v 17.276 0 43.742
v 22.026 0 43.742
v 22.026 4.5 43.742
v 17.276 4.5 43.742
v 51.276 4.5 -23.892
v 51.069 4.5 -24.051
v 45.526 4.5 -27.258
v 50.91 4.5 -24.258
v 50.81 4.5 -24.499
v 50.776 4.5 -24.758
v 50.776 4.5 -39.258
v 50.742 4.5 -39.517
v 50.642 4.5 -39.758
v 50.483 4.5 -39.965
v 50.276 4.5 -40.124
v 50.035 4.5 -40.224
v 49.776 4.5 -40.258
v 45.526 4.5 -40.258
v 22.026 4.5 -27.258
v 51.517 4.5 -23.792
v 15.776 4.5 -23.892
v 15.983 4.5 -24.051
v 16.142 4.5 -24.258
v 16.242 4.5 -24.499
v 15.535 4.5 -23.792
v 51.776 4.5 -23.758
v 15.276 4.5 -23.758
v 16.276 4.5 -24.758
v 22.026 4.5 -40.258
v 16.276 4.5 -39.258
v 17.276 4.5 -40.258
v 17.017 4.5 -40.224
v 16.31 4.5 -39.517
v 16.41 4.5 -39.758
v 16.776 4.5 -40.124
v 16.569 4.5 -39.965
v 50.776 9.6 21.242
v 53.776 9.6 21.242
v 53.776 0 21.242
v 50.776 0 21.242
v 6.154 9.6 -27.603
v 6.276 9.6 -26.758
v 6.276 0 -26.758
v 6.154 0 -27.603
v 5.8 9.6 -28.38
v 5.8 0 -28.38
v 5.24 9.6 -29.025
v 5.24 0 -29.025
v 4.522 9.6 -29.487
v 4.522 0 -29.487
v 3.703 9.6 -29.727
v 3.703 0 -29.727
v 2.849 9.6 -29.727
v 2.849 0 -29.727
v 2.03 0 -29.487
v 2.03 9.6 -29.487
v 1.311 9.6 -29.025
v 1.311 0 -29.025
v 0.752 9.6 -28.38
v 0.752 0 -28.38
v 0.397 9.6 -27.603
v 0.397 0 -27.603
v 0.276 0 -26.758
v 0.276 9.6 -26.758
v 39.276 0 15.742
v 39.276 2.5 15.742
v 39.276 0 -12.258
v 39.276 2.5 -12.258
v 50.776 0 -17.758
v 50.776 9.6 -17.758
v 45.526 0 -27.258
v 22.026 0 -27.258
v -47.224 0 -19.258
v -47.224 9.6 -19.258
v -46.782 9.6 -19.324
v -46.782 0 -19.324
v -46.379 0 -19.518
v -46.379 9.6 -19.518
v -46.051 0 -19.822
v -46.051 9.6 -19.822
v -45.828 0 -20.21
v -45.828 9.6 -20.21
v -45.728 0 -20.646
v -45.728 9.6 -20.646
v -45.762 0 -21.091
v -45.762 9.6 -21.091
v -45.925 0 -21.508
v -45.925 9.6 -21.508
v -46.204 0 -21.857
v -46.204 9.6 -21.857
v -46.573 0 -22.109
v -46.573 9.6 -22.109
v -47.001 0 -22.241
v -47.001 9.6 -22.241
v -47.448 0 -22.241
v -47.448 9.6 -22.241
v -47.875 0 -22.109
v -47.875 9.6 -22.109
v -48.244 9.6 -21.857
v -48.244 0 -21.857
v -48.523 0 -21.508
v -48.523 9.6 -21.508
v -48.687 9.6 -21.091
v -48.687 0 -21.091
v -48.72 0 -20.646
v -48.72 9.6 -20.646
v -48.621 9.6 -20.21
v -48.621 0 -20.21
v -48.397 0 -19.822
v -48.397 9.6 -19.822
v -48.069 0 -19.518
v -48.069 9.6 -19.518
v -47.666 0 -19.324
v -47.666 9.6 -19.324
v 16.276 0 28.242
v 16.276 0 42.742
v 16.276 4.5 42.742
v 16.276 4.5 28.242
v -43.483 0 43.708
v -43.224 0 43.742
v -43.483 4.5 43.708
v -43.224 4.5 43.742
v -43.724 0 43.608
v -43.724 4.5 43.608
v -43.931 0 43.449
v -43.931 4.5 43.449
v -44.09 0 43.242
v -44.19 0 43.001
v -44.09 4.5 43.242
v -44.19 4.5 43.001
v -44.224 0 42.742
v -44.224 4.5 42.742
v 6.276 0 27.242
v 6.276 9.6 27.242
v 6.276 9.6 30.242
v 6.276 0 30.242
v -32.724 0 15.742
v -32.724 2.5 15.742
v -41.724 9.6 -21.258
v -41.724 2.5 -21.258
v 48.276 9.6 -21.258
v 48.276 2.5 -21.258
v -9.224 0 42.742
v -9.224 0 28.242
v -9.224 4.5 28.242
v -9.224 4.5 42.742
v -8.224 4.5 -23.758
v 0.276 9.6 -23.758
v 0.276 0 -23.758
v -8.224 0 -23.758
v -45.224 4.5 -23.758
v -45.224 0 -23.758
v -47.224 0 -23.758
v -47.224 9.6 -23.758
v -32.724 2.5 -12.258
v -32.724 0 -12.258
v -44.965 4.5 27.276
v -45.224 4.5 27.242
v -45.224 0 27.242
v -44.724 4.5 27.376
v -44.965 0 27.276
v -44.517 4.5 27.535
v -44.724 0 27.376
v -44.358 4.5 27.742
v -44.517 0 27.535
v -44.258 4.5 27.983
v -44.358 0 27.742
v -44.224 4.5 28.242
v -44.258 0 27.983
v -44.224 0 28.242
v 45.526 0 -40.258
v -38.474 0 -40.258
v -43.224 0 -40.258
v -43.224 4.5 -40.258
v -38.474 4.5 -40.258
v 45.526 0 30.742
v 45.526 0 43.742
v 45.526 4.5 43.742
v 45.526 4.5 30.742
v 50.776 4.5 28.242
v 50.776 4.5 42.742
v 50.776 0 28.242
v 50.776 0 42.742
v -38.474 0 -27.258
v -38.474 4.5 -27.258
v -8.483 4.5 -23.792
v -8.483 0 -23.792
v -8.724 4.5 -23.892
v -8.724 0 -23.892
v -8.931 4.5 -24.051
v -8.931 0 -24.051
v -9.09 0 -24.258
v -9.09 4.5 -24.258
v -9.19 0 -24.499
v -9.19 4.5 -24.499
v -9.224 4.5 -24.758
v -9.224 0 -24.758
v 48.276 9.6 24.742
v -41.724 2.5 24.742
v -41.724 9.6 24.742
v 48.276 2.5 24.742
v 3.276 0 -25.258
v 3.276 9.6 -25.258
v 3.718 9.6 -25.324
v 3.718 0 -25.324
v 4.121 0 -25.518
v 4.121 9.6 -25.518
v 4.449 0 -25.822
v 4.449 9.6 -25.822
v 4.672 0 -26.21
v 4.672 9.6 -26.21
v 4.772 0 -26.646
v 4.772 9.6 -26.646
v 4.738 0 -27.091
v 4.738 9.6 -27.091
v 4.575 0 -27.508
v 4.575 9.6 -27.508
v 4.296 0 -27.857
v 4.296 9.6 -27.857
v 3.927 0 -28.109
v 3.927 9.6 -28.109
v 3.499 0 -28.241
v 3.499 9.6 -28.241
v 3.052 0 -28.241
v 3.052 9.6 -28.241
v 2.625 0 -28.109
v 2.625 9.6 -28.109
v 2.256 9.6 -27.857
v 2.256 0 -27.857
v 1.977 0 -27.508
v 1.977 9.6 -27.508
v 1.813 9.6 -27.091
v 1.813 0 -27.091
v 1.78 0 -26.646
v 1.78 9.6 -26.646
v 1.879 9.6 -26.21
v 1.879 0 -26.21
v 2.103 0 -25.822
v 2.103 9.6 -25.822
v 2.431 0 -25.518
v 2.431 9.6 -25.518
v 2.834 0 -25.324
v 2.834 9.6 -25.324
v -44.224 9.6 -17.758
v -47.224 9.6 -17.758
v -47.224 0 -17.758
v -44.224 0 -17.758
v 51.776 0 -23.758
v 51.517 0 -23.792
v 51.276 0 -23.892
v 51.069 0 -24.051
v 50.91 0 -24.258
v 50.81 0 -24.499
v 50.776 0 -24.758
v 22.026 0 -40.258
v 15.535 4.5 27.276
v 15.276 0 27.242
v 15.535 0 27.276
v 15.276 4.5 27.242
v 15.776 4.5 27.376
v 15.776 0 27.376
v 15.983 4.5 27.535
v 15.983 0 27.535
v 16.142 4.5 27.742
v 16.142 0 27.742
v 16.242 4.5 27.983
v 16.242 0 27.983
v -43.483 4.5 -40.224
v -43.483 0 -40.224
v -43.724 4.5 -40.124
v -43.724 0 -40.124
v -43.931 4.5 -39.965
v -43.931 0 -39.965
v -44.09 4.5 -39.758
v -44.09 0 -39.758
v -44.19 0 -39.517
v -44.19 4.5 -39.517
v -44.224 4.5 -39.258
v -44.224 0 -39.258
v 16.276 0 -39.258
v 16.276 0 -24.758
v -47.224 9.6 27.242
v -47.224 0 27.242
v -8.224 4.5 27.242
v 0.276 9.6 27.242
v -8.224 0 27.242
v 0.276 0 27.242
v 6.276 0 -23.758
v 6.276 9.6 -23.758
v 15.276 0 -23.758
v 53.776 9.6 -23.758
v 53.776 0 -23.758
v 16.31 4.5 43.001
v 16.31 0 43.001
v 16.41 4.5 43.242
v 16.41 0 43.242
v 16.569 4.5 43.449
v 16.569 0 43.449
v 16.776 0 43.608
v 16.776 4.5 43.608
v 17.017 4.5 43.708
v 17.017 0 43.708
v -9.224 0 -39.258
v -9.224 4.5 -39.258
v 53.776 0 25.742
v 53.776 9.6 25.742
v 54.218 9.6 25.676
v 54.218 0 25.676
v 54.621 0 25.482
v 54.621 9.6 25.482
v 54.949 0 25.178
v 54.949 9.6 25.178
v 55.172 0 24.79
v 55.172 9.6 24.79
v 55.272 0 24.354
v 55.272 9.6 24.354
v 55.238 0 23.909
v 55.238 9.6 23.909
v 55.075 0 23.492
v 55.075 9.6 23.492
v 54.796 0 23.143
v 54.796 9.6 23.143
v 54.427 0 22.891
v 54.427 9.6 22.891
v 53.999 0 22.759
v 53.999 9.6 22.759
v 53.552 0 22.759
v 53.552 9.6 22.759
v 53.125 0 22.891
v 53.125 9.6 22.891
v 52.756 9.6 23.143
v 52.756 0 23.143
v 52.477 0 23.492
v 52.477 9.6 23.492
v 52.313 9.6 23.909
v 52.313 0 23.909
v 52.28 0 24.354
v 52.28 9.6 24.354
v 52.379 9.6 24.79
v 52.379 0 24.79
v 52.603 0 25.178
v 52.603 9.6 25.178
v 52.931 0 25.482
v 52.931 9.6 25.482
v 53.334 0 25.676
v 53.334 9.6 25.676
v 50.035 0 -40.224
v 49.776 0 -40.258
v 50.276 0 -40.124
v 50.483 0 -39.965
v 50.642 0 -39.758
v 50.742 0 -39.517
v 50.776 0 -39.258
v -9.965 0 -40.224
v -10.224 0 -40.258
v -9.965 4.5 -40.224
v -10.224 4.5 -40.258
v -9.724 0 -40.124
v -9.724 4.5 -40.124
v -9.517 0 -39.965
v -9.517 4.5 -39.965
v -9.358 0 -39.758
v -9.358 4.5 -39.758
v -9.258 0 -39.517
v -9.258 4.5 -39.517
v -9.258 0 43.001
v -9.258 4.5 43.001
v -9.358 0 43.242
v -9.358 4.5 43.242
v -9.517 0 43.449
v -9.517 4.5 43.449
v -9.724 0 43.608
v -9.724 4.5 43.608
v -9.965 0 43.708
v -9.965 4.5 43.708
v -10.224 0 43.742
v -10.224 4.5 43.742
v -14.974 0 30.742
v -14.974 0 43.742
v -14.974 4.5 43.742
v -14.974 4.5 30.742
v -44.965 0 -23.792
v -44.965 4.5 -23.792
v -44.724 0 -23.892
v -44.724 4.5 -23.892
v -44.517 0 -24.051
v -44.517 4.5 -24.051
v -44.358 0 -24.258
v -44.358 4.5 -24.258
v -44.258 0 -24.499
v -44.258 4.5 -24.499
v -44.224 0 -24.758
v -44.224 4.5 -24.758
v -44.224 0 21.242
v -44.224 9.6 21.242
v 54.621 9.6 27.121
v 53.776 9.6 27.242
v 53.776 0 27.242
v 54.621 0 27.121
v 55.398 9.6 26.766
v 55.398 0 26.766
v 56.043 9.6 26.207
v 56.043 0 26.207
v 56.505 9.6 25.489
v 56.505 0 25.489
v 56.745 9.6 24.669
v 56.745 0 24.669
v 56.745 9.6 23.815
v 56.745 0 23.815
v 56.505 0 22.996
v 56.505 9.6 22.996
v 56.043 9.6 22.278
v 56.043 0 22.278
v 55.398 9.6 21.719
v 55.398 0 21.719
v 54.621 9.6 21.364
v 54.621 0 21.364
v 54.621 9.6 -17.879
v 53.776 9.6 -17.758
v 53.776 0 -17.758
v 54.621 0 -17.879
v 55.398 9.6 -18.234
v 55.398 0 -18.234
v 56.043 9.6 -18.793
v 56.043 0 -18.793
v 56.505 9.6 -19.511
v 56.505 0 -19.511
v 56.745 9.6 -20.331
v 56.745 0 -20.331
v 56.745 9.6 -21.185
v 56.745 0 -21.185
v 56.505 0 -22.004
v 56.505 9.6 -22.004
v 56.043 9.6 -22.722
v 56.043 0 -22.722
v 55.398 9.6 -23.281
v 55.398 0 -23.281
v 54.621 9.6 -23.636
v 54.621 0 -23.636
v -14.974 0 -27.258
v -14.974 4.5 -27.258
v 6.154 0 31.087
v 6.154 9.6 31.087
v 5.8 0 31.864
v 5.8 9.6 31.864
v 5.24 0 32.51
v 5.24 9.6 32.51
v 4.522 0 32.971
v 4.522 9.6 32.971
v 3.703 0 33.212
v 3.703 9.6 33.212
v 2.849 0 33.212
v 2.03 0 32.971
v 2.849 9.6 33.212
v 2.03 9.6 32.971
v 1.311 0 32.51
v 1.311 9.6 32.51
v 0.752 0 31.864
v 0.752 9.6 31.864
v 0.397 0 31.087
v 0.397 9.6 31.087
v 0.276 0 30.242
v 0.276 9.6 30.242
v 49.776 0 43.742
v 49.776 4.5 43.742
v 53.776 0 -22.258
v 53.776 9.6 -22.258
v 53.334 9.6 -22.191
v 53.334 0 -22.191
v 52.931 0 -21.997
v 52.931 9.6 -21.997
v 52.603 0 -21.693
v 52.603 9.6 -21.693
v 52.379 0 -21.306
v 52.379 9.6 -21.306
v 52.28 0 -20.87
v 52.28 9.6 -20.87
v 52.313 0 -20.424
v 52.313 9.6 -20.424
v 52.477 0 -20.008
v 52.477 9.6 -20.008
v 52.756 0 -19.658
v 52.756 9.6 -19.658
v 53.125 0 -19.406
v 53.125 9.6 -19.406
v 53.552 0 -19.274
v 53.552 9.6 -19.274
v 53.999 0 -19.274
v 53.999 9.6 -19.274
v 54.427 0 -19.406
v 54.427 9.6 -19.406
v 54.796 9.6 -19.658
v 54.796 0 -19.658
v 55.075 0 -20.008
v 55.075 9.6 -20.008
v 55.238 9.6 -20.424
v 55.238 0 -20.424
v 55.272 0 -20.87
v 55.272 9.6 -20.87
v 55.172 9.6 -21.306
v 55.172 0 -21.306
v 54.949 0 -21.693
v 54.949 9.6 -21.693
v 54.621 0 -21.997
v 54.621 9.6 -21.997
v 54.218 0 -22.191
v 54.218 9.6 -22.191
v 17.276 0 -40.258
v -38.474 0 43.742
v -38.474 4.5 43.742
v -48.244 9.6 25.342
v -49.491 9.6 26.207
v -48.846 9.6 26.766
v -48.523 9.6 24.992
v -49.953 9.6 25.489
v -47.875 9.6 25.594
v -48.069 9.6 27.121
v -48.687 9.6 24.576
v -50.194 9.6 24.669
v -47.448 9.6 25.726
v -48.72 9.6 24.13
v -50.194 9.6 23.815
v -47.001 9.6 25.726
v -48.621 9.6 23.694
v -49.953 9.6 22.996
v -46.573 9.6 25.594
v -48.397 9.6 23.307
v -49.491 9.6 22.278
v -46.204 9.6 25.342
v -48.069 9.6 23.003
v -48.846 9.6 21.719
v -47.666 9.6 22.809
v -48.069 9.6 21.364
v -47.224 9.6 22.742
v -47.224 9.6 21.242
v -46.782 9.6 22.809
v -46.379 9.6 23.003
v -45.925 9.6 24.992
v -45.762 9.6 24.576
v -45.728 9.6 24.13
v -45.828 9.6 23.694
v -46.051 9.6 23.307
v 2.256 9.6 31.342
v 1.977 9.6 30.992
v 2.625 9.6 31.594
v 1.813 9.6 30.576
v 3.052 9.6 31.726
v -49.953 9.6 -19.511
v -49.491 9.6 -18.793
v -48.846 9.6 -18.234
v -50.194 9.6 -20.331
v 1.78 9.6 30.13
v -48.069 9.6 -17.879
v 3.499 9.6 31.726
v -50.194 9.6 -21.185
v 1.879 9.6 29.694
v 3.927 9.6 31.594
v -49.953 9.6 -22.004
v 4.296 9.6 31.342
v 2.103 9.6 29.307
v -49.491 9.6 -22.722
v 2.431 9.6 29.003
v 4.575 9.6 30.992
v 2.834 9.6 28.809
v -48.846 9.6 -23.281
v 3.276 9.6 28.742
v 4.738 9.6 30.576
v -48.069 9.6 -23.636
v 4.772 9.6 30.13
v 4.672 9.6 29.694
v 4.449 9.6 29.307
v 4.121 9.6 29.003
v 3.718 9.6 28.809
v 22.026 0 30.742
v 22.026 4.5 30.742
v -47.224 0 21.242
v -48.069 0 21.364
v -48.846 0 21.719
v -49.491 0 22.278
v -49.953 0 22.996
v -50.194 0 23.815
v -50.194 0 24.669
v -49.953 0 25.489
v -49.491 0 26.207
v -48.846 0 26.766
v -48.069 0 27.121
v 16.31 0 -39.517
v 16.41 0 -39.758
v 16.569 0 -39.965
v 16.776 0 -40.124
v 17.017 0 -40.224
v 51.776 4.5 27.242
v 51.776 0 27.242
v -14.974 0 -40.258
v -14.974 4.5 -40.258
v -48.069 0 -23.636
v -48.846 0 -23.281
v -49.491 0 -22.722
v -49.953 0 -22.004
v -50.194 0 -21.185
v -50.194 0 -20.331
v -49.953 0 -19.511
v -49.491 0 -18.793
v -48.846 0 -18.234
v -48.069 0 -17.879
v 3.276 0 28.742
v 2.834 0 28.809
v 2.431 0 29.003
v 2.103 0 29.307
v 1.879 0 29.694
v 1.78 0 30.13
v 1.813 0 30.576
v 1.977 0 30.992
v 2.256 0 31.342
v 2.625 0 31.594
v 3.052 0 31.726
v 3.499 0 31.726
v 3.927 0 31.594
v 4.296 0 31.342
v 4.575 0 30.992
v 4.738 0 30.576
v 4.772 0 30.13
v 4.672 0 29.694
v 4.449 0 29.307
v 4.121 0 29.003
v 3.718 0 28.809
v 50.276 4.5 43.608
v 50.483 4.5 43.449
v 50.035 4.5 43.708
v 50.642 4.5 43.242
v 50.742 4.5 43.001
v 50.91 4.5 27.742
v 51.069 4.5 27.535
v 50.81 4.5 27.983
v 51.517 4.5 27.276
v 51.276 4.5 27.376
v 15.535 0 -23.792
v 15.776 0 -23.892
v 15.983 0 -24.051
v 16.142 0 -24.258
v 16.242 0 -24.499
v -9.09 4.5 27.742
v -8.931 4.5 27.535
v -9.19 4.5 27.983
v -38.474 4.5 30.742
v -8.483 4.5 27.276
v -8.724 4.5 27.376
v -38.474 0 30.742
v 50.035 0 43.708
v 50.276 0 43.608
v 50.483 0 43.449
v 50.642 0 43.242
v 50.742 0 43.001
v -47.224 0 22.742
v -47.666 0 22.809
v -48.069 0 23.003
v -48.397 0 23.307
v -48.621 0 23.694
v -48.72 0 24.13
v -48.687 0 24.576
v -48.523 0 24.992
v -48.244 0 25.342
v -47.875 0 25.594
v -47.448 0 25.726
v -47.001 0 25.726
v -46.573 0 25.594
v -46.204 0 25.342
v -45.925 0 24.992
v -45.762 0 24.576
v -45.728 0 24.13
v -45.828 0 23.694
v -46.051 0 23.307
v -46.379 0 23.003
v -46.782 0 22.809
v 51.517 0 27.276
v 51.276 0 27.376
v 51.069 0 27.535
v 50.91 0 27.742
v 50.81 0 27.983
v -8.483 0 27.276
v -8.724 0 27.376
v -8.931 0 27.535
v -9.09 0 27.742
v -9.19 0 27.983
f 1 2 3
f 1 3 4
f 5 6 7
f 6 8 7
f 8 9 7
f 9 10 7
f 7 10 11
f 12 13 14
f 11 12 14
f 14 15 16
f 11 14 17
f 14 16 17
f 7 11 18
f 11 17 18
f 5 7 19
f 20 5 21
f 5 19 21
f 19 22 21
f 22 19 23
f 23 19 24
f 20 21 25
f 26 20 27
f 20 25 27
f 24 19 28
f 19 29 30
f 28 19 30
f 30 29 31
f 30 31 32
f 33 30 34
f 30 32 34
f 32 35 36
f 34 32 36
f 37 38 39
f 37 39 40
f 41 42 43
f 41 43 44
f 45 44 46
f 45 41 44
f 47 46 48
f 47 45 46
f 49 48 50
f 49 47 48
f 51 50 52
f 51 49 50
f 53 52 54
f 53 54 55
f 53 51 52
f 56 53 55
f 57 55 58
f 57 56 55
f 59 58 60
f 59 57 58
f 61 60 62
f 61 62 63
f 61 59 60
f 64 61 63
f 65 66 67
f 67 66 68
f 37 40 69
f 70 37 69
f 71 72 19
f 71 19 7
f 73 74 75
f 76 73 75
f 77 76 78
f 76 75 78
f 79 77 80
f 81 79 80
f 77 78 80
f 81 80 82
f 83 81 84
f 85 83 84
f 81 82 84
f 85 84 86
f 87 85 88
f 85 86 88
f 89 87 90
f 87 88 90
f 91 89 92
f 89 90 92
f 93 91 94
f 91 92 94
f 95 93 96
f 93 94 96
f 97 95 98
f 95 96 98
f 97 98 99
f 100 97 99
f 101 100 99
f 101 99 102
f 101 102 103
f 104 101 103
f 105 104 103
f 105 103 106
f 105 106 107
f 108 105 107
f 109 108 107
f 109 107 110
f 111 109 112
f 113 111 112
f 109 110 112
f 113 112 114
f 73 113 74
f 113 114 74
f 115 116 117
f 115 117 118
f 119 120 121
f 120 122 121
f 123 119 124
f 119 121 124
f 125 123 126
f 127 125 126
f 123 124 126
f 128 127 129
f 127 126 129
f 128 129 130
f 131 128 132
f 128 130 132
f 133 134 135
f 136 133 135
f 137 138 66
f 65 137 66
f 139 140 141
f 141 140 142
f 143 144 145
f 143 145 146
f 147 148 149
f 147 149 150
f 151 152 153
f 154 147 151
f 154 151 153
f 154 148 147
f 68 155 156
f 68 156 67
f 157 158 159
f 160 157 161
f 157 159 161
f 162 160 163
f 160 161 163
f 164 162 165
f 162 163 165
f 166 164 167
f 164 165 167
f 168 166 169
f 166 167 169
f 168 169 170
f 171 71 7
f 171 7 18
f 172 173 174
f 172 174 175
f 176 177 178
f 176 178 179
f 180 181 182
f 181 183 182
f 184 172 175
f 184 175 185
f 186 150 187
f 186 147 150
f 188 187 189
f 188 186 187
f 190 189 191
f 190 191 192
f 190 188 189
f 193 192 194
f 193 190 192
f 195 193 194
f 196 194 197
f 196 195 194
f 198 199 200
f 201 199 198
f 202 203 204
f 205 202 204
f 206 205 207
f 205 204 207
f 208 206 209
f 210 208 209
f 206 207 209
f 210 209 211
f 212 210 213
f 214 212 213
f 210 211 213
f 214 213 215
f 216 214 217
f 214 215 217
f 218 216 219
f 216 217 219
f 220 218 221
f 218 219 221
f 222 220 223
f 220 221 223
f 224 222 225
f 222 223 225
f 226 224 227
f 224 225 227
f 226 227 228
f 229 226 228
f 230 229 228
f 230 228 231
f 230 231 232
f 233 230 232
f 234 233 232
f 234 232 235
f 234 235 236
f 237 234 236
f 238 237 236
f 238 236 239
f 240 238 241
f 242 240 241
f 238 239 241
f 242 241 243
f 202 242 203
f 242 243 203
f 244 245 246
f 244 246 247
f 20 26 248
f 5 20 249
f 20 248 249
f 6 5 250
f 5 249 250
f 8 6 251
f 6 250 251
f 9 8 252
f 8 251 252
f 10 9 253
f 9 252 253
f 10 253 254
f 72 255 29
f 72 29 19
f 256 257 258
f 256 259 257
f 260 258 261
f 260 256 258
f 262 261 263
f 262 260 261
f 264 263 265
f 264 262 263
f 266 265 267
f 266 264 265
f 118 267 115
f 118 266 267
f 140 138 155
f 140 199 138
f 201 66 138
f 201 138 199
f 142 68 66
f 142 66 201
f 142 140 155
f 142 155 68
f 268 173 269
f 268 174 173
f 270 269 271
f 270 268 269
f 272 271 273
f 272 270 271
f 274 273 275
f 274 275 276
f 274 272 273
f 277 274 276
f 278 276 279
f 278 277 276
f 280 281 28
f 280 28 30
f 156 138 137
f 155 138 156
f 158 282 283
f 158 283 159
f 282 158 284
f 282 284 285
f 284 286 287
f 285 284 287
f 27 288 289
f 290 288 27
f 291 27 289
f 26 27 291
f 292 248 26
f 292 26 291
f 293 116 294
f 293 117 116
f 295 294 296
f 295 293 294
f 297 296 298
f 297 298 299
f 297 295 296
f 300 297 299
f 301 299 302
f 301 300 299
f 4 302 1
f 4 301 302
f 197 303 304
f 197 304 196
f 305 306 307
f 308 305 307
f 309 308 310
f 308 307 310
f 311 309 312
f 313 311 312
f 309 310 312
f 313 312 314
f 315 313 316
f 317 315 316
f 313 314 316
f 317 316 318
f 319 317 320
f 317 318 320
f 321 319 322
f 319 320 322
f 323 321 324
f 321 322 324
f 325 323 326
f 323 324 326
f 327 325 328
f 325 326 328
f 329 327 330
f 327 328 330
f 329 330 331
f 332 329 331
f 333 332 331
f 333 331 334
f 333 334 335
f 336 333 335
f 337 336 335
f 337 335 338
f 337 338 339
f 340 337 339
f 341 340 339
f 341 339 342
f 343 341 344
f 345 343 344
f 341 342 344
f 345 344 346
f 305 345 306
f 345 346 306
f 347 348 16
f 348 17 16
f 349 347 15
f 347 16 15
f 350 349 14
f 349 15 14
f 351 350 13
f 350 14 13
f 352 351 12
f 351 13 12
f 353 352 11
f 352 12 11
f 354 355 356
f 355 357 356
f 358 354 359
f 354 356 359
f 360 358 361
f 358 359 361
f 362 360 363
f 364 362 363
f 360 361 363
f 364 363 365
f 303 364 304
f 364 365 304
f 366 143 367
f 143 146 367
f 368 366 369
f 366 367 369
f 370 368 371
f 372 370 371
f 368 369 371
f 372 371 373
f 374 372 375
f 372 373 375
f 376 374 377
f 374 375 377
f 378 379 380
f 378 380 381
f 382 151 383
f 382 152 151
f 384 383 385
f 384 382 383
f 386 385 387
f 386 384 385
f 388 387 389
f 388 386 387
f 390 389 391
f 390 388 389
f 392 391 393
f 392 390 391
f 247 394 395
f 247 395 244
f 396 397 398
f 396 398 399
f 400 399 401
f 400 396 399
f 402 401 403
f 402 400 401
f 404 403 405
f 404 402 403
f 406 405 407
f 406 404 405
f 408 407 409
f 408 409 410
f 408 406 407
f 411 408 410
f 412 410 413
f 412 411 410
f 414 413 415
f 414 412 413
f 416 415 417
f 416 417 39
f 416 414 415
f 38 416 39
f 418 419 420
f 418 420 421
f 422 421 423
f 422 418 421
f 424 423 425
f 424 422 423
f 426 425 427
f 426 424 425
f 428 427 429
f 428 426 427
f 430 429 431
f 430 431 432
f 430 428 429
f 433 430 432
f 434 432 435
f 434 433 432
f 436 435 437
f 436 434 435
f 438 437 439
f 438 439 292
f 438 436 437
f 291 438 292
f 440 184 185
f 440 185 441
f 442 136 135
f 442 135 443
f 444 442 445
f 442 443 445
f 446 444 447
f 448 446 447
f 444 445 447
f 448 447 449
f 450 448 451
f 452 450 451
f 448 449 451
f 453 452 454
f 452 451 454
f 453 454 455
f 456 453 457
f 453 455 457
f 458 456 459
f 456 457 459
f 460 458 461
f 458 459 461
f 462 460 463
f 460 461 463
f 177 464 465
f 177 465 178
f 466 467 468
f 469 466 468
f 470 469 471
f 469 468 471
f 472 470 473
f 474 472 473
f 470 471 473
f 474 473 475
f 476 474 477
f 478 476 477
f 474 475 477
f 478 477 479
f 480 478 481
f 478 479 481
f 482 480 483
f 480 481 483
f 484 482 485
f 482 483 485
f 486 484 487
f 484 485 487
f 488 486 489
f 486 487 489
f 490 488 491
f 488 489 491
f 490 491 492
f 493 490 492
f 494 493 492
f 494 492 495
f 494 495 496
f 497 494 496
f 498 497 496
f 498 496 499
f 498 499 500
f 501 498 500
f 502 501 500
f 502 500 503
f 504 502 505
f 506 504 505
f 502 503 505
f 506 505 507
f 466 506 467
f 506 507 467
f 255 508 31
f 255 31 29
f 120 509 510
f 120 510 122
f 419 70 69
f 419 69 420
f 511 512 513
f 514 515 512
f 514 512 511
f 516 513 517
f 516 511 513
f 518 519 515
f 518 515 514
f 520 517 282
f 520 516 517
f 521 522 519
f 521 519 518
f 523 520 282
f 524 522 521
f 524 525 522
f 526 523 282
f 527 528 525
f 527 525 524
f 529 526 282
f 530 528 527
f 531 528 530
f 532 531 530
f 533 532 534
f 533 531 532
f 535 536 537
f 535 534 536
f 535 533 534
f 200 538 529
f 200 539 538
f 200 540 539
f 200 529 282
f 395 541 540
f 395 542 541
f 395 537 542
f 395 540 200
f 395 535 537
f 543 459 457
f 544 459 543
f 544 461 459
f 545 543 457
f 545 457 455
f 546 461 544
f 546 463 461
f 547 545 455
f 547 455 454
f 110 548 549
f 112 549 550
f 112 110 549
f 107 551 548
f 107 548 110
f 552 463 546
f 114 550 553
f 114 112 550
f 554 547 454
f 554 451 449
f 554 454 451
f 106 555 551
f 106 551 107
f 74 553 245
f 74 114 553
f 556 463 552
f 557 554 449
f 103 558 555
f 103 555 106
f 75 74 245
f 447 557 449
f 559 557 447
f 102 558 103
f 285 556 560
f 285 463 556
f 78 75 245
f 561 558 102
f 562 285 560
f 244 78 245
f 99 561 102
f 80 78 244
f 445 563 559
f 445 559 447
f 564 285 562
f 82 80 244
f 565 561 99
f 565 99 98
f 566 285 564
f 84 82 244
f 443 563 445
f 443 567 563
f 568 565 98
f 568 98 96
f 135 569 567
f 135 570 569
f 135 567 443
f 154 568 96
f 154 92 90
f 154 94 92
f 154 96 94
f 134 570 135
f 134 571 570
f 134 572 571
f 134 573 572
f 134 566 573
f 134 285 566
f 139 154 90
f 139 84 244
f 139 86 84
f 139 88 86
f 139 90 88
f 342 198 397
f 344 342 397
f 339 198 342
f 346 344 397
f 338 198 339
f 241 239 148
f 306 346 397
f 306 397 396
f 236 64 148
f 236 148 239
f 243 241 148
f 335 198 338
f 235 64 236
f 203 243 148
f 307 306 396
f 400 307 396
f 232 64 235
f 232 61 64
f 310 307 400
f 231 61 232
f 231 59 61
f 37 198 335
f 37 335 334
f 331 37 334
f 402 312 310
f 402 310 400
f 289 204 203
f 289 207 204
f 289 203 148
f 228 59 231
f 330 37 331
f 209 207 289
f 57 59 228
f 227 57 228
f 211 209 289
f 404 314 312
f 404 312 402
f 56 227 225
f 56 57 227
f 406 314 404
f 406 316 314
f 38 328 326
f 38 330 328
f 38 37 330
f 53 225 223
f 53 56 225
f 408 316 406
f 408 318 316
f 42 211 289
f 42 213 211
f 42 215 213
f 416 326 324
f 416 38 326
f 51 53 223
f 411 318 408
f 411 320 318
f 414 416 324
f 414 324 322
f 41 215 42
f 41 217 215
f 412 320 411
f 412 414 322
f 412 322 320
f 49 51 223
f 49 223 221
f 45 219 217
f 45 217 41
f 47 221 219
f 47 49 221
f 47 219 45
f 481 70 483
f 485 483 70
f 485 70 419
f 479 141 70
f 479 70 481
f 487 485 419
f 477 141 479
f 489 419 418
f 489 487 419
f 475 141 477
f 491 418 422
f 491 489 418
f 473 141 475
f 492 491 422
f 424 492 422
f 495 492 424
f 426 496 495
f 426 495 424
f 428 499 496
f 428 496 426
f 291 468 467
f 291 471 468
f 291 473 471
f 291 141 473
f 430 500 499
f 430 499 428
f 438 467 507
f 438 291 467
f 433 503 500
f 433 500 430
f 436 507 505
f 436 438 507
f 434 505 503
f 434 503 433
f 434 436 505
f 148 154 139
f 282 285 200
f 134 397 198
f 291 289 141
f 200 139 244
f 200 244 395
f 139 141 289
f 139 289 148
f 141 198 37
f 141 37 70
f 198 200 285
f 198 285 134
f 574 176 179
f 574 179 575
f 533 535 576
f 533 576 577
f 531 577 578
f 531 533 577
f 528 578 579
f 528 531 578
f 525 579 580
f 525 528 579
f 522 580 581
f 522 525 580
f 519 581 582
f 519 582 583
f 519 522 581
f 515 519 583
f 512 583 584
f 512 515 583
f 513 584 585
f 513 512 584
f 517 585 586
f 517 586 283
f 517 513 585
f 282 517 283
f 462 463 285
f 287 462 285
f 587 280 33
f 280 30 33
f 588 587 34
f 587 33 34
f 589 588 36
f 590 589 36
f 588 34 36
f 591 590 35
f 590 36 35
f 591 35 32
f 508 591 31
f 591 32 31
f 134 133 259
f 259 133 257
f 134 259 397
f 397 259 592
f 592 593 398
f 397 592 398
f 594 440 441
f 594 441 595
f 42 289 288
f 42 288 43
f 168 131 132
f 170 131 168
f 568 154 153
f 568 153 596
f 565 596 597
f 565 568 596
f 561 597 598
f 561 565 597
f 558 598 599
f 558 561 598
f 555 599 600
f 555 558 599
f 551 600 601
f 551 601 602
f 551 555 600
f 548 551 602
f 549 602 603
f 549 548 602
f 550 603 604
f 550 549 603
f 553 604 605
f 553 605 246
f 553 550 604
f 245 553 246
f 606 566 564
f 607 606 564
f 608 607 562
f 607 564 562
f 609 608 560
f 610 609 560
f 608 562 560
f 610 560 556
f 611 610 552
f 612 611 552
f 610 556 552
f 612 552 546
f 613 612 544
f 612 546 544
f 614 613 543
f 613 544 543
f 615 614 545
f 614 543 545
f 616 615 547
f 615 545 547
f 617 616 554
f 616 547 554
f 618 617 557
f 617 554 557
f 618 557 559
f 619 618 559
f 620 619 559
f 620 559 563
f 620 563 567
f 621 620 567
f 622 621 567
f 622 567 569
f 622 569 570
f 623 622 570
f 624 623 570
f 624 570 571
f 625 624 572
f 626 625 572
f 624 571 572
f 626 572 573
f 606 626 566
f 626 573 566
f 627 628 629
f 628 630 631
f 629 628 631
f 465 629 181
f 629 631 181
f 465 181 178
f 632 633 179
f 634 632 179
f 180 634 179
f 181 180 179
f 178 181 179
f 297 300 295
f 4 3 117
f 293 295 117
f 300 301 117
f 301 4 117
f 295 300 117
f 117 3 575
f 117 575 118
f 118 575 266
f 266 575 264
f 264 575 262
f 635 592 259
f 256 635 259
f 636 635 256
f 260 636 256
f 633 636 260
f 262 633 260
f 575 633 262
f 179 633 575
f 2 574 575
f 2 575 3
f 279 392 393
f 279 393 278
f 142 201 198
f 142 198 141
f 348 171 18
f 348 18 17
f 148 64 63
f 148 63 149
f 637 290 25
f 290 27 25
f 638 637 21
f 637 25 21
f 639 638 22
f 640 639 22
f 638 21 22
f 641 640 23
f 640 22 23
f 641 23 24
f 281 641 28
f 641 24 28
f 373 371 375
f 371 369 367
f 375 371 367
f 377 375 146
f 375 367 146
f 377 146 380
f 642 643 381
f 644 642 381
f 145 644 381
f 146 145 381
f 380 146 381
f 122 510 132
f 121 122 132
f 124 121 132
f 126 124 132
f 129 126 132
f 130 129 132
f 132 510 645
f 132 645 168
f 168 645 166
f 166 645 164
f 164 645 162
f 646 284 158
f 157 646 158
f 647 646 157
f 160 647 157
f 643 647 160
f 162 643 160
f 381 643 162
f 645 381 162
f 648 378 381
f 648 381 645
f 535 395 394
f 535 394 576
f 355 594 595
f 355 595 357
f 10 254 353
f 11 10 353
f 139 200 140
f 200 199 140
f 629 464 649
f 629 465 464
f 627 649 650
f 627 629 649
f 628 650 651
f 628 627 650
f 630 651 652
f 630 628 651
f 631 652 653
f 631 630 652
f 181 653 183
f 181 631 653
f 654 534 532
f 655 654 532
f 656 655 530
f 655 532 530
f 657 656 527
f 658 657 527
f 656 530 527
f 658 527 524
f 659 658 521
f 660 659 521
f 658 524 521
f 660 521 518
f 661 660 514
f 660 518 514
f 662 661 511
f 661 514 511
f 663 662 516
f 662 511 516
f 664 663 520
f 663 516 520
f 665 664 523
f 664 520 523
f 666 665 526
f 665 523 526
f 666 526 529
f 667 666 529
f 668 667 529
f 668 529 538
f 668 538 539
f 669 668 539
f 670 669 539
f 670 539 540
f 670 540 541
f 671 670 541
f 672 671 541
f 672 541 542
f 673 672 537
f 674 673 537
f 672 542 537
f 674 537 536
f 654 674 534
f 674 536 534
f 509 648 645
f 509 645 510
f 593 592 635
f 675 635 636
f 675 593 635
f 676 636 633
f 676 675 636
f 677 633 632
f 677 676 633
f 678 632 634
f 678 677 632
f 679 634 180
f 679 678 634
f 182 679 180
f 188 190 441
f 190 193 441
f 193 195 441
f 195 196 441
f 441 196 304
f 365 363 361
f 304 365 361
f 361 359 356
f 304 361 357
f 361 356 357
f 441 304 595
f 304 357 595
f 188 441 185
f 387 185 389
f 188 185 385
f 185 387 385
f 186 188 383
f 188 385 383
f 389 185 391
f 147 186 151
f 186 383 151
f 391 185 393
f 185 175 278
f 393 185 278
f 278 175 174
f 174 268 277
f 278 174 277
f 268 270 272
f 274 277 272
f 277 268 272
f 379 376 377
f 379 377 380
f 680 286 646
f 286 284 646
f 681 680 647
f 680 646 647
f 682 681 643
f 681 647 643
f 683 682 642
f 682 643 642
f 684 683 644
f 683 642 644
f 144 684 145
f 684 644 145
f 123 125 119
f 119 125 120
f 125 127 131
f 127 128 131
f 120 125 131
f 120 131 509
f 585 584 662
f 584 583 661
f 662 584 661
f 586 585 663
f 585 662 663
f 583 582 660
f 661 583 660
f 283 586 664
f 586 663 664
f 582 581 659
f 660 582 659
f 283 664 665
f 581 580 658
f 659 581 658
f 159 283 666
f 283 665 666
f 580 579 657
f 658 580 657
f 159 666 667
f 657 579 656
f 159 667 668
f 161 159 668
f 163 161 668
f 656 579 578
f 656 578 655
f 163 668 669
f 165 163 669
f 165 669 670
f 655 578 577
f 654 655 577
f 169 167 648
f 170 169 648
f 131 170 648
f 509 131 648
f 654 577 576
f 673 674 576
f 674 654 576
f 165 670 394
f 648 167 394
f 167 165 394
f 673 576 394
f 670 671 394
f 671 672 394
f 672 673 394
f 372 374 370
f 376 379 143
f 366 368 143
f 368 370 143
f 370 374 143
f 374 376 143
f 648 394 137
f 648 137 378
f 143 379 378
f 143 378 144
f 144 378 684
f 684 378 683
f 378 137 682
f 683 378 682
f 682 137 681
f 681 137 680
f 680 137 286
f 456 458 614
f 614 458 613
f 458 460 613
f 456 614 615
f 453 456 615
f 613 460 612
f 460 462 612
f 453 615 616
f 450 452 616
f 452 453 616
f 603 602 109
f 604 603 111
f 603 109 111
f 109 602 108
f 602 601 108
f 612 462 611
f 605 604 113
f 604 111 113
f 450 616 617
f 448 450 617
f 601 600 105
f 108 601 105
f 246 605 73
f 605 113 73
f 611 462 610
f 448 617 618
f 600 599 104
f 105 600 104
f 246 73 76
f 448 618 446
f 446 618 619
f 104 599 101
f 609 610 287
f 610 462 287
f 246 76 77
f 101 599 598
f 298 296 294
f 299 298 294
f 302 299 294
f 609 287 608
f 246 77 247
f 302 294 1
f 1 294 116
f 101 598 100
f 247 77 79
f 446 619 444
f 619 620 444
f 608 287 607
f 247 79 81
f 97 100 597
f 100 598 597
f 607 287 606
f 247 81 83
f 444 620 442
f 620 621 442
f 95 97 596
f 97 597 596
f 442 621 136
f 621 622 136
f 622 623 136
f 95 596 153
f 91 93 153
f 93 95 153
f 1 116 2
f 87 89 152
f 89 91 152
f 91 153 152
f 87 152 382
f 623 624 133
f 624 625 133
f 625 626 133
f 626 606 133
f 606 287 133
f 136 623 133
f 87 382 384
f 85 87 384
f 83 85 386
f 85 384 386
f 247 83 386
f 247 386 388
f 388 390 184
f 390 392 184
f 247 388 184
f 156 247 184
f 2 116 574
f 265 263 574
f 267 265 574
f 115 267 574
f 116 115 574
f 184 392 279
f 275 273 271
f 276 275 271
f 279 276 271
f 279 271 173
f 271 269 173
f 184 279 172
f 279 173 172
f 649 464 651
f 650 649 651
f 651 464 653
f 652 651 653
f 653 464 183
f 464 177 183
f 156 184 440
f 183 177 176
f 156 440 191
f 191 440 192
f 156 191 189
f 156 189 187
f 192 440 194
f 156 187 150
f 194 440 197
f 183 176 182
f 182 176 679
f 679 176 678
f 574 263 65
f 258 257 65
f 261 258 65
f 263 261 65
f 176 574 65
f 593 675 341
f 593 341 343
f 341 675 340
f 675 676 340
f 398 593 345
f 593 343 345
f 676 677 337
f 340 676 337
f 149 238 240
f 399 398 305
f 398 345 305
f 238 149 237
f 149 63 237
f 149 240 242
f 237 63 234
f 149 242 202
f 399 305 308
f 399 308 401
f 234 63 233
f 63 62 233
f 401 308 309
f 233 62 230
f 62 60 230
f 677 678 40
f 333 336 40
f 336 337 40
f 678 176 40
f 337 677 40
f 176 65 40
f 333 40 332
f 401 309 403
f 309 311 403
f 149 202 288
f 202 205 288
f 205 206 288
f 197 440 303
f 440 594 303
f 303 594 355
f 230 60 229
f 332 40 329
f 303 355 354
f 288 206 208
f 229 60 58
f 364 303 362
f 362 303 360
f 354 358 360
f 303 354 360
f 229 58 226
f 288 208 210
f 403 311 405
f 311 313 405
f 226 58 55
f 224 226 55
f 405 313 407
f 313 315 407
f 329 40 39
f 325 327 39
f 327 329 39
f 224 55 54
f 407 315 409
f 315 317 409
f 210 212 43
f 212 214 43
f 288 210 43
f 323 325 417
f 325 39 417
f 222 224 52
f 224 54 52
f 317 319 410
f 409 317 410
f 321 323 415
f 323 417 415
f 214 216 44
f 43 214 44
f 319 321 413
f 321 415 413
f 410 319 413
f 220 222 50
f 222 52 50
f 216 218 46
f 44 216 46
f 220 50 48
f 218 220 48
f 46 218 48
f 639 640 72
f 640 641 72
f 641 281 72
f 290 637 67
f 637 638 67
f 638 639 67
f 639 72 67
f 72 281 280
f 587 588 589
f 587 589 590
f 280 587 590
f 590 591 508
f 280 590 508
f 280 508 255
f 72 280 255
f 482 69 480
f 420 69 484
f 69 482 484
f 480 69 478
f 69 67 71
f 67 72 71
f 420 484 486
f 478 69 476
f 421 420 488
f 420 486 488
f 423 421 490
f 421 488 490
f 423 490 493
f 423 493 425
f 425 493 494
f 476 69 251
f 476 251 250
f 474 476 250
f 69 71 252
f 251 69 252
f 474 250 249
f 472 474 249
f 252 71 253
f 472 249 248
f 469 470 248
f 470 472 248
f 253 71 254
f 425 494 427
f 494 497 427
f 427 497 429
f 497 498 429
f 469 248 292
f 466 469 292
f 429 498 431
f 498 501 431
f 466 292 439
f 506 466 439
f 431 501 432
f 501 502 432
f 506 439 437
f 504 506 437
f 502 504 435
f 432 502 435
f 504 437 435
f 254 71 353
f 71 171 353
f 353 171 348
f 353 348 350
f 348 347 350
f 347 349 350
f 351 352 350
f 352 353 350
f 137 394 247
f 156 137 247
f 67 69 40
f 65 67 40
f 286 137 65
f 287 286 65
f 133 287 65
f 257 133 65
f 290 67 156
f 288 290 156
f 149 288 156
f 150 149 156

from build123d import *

# Parameters (mm, degrees)
BOSS_EXTRUDE1_DEPTH = 4.5
SKETCH2_W           = 72
SKETCH2_H           = 28
CUT_EXTRUDE1_DEPTH  = 4.5
SKETCH3_W           = 95
SKETCH3_H           = 51
SKETCH3_W_2         = 90
SKETCH3_H_2         = 46
BOSS_EXTRUDE2_DEPTH = 5.1
SKETCH4_W           = 90
SKETCH4_H           = 46
CUT_EXTRUDE2_DEPTH  = 2
SKETCH6_R           = 1.5
BOSS_EXTRUDE3_DEPTH = 9.6
FILLET1_R           = 1


with BuildPart() as part:
    # Sketch1 → Boss-Extrude1 (new body)
    with BuildSketch(Plane(origin=(0, 0, 0), x_dir=(1, 0, 0), z_dir=(0, 1, 0))):
        Polygon((-14.974237314, -43.742281537), (-14.974237314, -30.742281537), (-38.474237314, -30.742281537), (-38.474237314, -43.742281537), (-44.224237314, -43.742281537), (-44.224237314, 40.257718463), (-38.474237314, 40.257718463), (-38.474237314, 27.257718463), (-14.974237314, 27.257718463), (-14.974237314, 40.257718463), (-9.224237314, 40.257718463), (-9.224237314, 23.757718463), (16.275762686, 23.757718463), (16.275762686, 40.257718463), (22.025762686, 40.257718463), (22.025762686, 27.257718463), (45.525762686, 27.257718463), (45.525762686, 40.257718463), (50.775762686, 40.257718463), (50.775762686, -43.742281537), (45.525762686, -43.742281537), (45.525762686, -30.742281537), (22.025762686, -30.742281537), (22.025762686, -43.742281537), (16.275762686, -43.742281537), (16.275762686, -27.242281537), (-9.224237314, -27.242281537), (-9.224237314, -43.742281537), align=None)
    extrude(amount=BOSS_EXTRUDE1_DEPTH)

    # Sketch2 → Cut-Extrude1 (cut)
    with BuildSketch(Plane(origin=(0, 4.5, 0), x_dir=(1, 0, 0), z_dir=(0, 1, 0))):
        with Locations((3.275762686, -1.742281537)):
            Rectangle(SKETCH2_W, SKETCH2_H)
    extrude(amount=-CUT_EXTRUDE1_DEPTH, mode=Mode.SUBTRACT)

    # Sketch3 → Boss-Extrude2 (add)
    with BuildSketch(Plane(origin=(0, 4.5, 0), x_dir=(1, 0, 0), z_dir=(0, 1, 0))):
        with Locations((3.275762686, -1.742281537)):
            Rectangle(SKETCH3_W, SKETCH3_H)
        with Locations((3.275762686, -1.742281537)):
            Rectangle(SKETCH3_W_2, SKETCH3_H_2, mode=Mode.SUBTRACT)
    extrude(amount=BOSS_EXTRUDE2_DEPTH)

    # Sketch4 → Cut-Extrude2 (cut)
    with BuildSketch(Plane(origin=(0, 4.5, 0), x_dir=(1, 0, 0), z_dir=(0, 1, 0))):
        with Locations((3.275762686, -1.742281537)):
            Rectangle(SKETCH4_W, SKETCH4_H)
    extrude(amount=-CUT_EXTRUDE2_DEPTH, mode=Mode.SUBTRACT)

    # Sketch6 → Boss-Extrude3 (add)
    # profile 1 of 6: a face of its own
    with BuildSketch(Plane(origin=(0, 9.6, 0), x_dir=(1, 0, 0), z_dir=(0, 1, 0))):
        with BuildLine():
            Line((-44.224237314, 23.757718463), (-47.224237314, 23.757718463))
            ThreePointArc((-47.224237314, 23.757718463), (-50.224237314, 20.757718463), (-47.224237314, 17.757718463))
            Line((-47.224237314, 17.757718463), (-44.224237314, 17.757718463))
            Line((-44.224237314, 17.757718463), (-44.224237314, 23.757718463))
        make_face()
        with Locations(Location((-47.224237314, 20.757718463, 0), (0, 0, 270))):
            Circle(SKETCH6_R, mode=Mode.SUBTRACT)
    # profile 2 of 6: a face of its own
    with BuildSketch(Plane(origin=(0, 9.6, 0), x_dir=(1, 0, 0), z_dir=(0, 1, 0))):
        with BuildLine():
            Line((50.775762686, 17.757718463), (53.775762686, 17.757718463))
            ThreePointArc((53.775762686, 17.757718463), (56.775762686, 20.757718463), (53.775762686, 23.757718463))
            Line((53.775762686, 23.757718463), (50.775762686, 23.757718463))
            Line((50.775762686, 23.757718463), (50.775762686, 17.757718463))
        make_face()
        with Locations(Location((53.775762686, 20.757718463, 0), (0, 0, 90))):
            Circle(SKETCH6_R, mode=Mode.SUBTRACT)
    # profile 3 of 6: a face of its own
    with BuildSketch(Plane(origin=(0, 9.6, 0), x_dir=(1, 0, 0), z_dir=(0, 1, 0))):
        with BuildLine():
            Line((50.775762686, -27.242281537), (53.775762686, -27.242281537))
            ThreePointArc((53.775762686, -27.242281537), (56.775762686, -24.242281537), (53.775762686, -21.242281537))
            Line((53.775762686, -21.242281537), (50.775762686, -21.242281537))
            Line((50.775762686, -21.242281537), (50.775762686, -27.242281537))
        make_face()
        with Locations(Location((53.775762686, -24.242281537, 0), (0, 0, 270))):
            Circle(SKETCH6_R, mode=Mode.SUBTRACT)
    # profile 4 of 6: a face of its own
    with BuildSketch(Plane(origin=(0, 9.6, 0), x_dir=(1, 0, 0), z_dir=(0, 1, 0))):
        with BuildLine():
            Line((-44.224237314, -21.242281537), (-47.224237314, -21.242281537))
            ThreePointArc((-47.224237314, -21.242281537), (-50.224237314, -24.242281537), (-47.224237314, -27.242281537))
            Line((-47.224237314, -27.242281537), (-44.224237314, -27.242281537))
            Line((-44.224237314, -27.242281537), (-44.224237314, -21.242281537))
        make_face()
        with Locations(Location((-47.224237314, -24.242281537, 0), (0, 0, 90))):
            Circle(SKETCH6_R, mode=Mode.SUBTRACT)
    # profile 5 of 6: a face of its own
    with BuildSketch(Plane(origin=(0, 9.6, 0), x_dir=(1, 0, 0), z_dir=(0, 1, 0))):
        with BuildLine():
            Line((6.275762686, -27.242281537), (6.275762686, -30.242281537))
            ThreePointArc((6.275762686, -30.242281537), (3.275762686, -33.242281537), (0.275762686, -30.242281537))
            Line((0.275762686, -30.242281537), (0.275762686, -27.242281537))
            Line((0.275762686, -27.242281537), (6.275762686, -27.242281537))
        make_face()
        with Locations(Location((3.275762686, -30.242281537, 0), (0, 0, 90))):
            Circle(SKETCH6_R, mode=Mode.SUBTRACT)
    # profile 6 of 6: a face of its own
    with BuildSketch(Plane(origin=(0, 9.6, 0), x_dir=(1, 0, 0), z_dir=(0, 1, 0))):
        with BuildLine():
            Line((0.275762686, 23.757718463), (6.275762686, 23.757718463))
            Line((6.275762686, 23.757718463), (6.275762686, 26.757718463))
            ThreePointArc((6.275762686, 26.757718463), (3.275762686, 29.757718463), (0.275762686, 26.757718463))
            Line((0.275762686, 26.757718463), (0.275762686, 23.757718463))
        make_face()
        with Locations(Location((3.275762686, 26.757718463, 0), (0, 0, 270))):
            Circle(SKETCH6_R, mode=Mode.SUBTRACT)
    extrude(amount=-BOSS_EXTRUDE3_DEPTH)

    # Fillet1
    fillet1_edges = [part.edges().sort_by_distance(p)[0] for p in [
        (-44.224237314, 2.25, -23.757718463),
        (50.775762686, 2.25, -23.757718463),
        (50.775762686, 2.25, 27.242281537),
        (-44.224237314, 2.25, 27.242281537),
        (-44.224237314, 2.25, 43.742281537),
        (-44.224237314, 2.25, -40.257718463),
        (-9.224237314, 2.25, -40.257718463),
        (-9.224237314, 2.25, -23.757718463),
        (16.275762686, 2.25, -23.757718463),
        (16.275762686, 2.25, -40.257718463),
        (50.775762686, 2.25, -40.257718463),
        (50.775762686, 2.25, 43.742281537),
        (16.275762686, 2.25, 43.742281537),
        (16.275762686, 2.25, 27.242281537),
        (-9.224237314, 2.25, 27.242281537),
        (-9.224237314, 2.25, 43.742281537),
    ]]
    fillet(fillet1_edges, radius=FILLET1_R)


solid = part.part
